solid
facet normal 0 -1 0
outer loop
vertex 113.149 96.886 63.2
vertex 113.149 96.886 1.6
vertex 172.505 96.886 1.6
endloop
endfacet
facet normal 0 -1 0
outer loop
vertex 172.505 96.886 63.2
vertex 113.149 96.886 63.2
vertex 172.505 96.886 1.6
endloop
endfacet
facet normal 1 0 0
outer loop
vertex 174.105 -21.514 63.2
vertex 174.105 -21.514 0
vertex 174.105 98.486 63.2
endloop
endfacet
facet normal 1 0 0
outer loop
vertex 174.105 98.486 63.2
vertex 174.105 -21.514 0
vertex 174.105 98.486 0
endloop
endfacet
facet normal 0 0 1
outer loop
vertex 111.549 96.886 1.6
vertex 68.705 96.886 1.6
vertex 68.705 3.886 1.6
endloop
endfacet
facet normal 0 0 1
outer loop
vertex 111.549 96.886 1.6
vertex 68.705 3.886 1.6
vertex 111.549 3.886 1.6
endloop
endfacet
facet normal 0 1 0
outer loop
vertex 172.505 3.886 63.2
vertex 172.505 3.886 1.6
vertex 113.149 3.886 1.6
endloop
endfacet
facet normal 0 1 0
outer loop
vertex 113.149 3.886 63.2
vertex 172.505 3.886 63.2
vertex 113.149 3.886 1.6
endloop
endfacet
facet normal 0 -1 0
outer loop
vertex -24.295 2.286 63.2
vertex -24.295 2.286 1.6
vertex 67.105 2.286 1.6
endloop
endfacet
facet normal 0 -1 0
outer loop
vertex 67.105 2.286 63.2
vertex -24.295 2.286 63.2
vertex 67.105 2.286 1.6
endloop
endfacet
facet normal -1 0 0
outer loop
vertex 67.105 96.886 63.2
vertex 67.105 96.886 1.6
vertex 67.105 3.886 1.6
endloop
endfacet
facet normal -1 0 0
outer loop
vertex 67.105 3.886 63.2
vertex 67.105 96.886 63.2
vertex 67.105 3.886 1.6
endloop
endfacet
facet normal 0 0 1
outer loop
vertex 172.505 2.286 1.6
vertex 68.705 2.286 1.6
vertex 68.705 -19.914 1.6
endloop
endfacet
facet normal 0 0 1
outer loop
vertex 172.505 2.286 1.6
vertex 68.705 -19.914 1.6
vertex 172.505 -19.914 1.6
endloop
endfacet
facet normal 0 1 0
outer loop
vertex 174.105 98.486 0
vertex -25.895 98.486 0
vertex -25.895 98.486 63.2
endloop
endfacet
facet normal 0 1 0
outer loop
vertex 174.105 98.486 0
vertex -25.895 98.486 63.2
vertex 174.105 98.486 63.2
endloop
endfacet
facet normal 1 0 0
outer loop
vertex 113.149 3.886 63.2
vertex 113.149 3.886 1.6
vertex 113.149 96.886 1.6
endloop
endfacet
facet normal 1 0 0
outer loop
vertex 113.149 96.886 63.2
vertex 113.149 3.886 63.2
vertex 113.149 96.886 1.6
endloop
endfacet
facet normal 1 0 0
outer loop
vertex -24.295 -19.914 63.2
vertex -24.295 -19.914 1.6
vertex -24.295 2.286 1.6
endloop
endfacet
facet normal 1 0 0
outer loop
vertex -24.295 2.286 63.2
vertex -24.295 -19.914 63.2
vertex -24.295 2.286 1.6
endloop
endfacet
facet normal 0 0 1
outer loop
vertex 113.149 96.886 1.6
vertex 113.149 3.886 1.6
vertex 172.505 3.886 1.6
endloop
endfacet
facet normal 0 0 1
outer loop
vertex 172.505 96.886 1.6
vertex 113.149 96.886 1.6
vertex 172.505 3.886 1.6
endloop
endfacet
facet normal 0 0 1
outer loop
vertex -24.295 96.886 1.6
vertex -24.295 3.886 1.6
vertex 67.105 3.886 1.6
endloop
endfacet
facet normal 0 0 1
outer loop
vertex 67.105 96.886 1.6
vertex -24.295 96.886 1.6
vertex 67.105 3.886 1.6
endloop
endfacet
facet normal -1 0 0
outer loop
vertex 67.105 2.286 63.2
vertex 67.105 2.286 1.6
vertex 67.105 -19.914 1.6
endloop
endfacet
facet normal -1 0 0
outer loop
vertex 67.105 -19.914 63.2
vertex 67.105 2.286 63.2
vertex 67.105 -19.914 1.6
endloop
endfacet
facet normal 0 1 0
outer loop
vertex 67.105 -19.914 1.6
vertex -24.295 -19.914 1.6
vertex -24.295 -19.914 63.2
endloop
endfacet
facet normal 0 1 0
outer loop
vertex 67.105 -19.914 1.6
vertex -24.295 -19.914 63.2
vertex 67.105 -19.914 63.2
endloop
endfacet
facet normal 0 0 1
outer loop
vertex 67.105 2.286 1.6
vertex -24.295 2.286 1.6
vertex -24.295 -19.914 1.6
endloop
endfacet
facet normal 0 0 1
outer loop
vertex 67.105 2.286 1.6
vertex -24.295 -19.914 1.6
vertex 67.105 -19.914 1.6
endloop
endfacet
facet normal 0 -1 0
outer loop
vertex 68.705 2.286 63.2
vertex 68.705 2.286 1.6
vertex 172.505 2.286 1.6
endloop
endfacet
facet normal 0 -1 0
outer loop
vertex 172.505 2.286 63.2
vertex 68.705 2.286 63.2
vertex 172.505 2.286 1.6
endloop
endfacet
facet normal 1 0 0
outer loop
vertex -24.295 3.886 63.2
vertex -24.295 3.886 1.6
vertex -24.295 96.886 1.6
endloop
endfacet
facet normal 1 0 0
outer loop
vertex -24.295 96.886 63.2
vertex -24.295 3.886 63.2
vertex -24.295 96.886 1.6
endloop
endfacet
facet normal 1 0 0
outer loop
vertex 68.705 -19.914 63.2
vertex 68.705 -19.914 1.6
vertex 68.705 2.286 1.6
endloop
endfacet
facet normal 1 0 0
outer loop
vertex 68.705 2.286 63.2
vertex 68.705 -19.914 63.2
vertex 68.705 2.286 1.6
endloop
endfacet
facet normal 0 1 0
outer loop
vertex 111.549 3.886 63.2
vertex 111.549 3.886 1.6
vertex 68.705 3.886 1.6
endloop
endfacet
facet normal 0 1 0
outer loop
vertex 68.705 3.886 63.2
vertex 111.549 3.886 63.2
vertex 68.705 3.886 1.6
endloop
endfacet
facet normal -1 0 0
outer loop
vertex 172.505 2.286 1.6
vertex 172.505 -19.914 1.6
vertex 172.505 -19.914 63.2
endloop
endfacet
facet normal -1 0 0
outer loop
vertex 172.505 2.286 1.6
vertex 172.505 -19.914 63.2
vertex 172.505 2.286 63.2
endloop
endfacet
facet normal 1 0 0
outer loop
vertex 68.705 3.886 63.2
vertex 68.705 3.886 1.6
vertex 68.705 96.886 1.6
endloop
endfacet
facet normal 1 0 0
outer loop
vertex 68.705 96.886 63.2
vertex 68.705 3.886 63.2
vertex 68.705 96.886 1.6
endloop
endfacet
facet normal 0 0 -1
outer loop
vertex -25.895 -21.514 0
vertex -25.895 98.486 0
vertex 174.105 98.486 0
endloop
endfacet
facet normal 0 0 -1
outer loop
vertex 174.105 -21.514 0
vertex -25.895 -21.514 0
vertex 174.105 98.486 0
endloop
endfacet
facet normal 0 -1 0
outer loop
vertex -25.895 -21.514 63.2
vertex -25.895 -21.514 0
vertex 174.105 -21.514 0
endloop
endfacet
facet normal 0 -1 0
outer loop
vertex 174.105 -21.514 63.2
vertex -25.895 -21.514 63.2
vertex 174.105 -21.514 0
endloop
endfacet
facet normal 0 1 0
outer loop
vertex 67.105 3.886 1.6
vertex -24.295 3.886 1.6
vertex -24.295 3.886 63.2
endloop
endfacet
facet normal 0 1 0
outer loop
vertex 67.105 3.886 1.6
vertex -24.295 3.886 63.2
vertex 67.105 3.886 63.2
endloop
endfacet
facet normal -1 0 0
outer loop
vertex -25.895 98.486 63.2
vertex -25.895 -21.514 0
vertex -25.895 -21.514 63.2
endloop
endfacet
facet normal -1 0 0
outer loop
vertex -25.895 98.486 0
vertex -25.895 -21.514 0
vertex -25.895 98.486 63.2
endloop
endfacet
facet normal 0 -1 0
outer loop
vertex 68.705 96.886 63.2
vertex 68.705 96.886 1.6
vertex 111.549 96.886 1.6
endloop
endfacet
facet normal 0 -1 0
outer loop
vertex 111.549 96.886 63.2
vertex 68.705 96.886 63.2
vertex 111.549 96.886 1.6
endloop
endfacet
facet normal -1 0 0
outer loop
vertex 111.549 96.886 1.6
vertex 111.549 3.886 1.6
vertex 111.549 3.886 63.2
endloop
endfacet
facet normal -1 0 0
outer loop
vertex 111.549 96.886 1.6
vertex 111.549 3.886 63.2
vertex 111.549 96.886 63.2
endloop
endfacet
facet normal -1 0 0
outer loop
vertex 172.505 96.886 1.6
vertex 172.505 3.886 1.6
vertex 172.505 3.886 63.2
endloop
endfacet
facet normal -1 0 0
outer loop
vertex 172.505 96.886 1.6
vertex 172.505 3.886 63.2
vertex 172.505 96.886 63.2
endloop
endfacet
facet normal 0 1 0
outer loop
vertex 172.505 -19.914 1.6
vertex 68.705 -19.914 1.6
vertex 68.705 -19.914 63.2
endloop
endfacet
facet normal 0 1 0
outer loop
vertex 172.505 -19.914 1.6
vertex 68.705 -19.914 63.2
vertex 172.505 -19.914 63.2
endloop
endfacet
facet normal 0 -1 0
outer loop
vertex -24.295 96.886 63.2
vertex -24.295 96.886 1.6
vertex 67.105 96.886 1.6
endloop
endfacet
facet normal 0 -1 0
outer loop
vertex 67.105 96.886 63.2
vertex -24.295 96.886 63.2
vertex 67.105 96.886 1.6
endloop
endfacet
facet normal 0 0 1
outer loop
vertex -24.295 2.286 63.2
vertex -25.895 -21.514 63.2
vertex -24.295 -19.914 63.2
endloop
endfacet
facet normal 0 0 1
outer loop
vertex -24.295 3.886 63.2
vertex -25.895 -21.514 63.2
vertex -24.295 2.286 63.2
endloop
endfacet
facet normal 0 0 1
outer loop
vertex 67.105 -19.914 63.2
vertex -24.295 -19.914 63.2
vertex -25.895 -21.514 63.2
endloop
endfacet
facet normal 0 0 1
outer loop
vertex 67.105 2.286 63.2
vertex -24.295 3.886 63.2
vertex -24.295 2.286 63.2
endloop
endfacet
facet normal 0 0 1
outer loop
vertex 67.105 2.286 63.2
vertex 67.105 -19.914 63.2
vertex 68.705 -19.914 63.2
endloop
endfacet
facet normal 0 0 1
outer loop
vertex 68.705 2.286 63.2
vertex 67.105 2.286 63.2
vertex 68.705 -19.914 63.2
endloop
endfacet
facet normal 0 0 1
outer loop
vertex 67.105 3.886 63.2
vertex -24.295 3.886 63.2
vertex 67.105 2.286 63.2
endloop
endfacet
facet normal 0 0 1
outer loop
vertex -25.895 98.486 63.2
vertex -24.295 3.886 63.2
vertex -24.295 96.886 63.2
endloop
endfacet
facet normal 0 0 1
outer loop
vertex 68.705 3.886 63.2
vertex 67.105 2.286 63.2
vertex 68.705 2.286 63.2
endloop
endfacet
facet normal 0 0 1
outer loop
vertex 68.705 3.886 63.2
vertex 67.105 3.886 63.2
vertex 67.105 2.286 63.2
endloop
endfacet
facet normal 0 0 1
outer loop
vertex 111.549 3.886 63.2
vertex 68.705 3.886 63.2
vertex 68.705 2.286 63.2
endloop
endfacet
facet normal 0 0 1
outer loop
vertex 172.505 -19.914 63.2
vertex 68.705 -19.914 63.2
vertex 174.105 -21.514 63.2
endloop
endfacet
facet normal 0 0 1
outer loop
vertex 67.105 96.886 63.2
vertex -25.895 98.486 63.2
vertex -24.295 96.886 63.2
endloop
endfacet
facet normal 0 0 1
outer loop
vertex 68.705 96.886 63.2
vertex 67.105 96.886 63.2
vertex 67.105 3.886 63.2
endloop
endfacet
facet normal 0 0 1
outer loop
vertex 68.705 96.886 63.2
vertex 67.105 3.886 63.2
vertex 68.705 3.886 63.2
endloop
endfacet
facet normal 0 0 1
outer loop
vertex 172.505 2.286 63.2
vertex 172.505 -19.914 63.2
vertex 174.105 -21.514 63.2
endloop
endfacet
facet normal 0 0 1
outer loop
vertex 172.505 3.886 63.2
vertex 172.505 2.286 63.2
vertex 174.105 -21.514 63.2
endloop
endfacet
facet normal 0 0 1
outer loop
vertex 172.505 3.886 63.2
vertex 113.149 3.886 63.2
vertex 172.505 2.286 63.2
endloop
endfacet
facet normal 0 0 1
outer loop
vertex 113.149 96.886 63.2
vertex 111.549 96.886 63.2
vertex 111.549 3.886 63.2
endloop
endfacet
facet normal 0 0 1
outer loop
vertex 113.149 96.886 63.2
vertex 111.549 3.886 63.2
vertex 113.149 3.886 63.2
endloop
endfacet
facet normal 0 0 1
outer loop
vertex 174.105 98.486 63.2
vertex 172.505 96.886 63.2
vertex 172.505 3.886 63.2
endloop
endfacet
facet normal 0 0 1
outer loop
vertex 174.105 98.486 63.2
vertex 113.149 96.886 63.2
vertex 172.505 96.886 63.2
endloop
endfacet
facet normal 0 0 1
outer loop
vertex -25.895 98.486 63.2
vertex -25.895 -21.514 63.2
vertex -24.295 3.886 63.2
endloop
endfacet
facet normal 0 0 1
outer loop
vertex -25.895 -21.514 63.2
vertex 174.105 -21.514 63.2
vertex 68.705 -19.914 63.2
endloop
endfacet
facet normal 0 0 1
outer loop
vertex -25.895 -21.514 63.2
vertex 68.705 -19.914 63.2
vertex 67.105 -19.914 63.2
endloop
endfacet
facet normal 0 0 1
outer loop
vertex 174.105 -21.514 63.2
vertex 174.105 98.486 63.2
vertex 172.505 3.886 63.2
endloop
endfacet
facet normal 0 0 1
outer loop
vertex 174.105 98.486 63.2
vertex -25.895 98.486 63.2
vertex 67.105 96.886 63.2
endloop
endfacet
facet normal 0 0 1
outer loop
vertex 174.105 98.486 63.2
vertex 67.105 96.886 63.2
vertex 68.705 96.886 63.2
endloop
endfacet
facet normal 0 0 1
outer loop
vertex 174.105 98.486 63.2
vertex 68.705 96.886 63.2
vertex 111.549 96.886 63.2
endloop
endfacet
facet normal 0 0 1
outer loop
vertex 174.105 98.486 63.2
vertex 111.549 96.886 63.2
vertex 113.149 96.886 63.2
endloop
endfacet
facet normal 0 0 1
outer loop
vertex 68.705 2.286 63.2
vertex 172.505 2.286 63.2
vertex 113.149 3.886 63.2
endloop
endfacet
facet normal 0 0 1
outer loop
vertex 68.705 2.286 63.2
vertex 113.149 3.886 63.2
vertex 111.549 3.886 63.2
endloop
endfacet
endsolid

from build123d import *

# Parameters (mm, degrees)
F2_W     = 200
F2_H     = 120
F3_DEPTH = 63.2
F4_T     = -1.6
F5_W     = 1.6
F5_H     = 1.6
F5_H_2   = 22.2
F5_H_3   = 93
F5_W_2   = 91.4
F6_DEPTH = 61.6


with BuildPart() as f3:
    # F2 (on Top) → F3 (new body)
    with BuildSketch(Plane.XY):
        with Locations((74.1047750609, 38.4864358604)):
            Rectangle(F2_W, F2_H)
    extrude(amount=F3_DEPTH)

    # F4
    f4_openings = [f3.faces().sort_by_distance(p)[0] for p in [
        (74.104775, 38.486436, 63.2),
    ]]
    offset(amount=F4_T, openings=f4_openings)

    # F5 (on face) → F6 (join, through all)
    with BuildSketch(Plane.XY.offset(1.6)):
        with Locations((67.9047750609, 3.0864358604)):
            Rectangle(F5_W, F5_H)
        with Locations((67.9047750609, -8.8135641396)):
            Rectangle(F5_W, F5_H_2)
        Polygon((113.1492195054, 3.8864358604), (111.5492195054, 3.8864358604), (68.7047750609, 3.8864358604), (68.7047750609, 2.2864358604), (172.5047750609, 2.2864358604), (172.5047750609, 3.8864358604), align=None)
        with Locations((67.9047750609, 50.3864358604)):
            Rectangle(F5_W, F5_H_3)
        with Locations((21.4047750609, 3.0864358604)):
            Rectangle(F5_W_2, F5_H)
        with Locations((112.3492195054, 50.3864358604)):
            Rectangle(F5_W, F5_H_3)
    extrude(amount=F6_DEPTH)


solid = f3.part
